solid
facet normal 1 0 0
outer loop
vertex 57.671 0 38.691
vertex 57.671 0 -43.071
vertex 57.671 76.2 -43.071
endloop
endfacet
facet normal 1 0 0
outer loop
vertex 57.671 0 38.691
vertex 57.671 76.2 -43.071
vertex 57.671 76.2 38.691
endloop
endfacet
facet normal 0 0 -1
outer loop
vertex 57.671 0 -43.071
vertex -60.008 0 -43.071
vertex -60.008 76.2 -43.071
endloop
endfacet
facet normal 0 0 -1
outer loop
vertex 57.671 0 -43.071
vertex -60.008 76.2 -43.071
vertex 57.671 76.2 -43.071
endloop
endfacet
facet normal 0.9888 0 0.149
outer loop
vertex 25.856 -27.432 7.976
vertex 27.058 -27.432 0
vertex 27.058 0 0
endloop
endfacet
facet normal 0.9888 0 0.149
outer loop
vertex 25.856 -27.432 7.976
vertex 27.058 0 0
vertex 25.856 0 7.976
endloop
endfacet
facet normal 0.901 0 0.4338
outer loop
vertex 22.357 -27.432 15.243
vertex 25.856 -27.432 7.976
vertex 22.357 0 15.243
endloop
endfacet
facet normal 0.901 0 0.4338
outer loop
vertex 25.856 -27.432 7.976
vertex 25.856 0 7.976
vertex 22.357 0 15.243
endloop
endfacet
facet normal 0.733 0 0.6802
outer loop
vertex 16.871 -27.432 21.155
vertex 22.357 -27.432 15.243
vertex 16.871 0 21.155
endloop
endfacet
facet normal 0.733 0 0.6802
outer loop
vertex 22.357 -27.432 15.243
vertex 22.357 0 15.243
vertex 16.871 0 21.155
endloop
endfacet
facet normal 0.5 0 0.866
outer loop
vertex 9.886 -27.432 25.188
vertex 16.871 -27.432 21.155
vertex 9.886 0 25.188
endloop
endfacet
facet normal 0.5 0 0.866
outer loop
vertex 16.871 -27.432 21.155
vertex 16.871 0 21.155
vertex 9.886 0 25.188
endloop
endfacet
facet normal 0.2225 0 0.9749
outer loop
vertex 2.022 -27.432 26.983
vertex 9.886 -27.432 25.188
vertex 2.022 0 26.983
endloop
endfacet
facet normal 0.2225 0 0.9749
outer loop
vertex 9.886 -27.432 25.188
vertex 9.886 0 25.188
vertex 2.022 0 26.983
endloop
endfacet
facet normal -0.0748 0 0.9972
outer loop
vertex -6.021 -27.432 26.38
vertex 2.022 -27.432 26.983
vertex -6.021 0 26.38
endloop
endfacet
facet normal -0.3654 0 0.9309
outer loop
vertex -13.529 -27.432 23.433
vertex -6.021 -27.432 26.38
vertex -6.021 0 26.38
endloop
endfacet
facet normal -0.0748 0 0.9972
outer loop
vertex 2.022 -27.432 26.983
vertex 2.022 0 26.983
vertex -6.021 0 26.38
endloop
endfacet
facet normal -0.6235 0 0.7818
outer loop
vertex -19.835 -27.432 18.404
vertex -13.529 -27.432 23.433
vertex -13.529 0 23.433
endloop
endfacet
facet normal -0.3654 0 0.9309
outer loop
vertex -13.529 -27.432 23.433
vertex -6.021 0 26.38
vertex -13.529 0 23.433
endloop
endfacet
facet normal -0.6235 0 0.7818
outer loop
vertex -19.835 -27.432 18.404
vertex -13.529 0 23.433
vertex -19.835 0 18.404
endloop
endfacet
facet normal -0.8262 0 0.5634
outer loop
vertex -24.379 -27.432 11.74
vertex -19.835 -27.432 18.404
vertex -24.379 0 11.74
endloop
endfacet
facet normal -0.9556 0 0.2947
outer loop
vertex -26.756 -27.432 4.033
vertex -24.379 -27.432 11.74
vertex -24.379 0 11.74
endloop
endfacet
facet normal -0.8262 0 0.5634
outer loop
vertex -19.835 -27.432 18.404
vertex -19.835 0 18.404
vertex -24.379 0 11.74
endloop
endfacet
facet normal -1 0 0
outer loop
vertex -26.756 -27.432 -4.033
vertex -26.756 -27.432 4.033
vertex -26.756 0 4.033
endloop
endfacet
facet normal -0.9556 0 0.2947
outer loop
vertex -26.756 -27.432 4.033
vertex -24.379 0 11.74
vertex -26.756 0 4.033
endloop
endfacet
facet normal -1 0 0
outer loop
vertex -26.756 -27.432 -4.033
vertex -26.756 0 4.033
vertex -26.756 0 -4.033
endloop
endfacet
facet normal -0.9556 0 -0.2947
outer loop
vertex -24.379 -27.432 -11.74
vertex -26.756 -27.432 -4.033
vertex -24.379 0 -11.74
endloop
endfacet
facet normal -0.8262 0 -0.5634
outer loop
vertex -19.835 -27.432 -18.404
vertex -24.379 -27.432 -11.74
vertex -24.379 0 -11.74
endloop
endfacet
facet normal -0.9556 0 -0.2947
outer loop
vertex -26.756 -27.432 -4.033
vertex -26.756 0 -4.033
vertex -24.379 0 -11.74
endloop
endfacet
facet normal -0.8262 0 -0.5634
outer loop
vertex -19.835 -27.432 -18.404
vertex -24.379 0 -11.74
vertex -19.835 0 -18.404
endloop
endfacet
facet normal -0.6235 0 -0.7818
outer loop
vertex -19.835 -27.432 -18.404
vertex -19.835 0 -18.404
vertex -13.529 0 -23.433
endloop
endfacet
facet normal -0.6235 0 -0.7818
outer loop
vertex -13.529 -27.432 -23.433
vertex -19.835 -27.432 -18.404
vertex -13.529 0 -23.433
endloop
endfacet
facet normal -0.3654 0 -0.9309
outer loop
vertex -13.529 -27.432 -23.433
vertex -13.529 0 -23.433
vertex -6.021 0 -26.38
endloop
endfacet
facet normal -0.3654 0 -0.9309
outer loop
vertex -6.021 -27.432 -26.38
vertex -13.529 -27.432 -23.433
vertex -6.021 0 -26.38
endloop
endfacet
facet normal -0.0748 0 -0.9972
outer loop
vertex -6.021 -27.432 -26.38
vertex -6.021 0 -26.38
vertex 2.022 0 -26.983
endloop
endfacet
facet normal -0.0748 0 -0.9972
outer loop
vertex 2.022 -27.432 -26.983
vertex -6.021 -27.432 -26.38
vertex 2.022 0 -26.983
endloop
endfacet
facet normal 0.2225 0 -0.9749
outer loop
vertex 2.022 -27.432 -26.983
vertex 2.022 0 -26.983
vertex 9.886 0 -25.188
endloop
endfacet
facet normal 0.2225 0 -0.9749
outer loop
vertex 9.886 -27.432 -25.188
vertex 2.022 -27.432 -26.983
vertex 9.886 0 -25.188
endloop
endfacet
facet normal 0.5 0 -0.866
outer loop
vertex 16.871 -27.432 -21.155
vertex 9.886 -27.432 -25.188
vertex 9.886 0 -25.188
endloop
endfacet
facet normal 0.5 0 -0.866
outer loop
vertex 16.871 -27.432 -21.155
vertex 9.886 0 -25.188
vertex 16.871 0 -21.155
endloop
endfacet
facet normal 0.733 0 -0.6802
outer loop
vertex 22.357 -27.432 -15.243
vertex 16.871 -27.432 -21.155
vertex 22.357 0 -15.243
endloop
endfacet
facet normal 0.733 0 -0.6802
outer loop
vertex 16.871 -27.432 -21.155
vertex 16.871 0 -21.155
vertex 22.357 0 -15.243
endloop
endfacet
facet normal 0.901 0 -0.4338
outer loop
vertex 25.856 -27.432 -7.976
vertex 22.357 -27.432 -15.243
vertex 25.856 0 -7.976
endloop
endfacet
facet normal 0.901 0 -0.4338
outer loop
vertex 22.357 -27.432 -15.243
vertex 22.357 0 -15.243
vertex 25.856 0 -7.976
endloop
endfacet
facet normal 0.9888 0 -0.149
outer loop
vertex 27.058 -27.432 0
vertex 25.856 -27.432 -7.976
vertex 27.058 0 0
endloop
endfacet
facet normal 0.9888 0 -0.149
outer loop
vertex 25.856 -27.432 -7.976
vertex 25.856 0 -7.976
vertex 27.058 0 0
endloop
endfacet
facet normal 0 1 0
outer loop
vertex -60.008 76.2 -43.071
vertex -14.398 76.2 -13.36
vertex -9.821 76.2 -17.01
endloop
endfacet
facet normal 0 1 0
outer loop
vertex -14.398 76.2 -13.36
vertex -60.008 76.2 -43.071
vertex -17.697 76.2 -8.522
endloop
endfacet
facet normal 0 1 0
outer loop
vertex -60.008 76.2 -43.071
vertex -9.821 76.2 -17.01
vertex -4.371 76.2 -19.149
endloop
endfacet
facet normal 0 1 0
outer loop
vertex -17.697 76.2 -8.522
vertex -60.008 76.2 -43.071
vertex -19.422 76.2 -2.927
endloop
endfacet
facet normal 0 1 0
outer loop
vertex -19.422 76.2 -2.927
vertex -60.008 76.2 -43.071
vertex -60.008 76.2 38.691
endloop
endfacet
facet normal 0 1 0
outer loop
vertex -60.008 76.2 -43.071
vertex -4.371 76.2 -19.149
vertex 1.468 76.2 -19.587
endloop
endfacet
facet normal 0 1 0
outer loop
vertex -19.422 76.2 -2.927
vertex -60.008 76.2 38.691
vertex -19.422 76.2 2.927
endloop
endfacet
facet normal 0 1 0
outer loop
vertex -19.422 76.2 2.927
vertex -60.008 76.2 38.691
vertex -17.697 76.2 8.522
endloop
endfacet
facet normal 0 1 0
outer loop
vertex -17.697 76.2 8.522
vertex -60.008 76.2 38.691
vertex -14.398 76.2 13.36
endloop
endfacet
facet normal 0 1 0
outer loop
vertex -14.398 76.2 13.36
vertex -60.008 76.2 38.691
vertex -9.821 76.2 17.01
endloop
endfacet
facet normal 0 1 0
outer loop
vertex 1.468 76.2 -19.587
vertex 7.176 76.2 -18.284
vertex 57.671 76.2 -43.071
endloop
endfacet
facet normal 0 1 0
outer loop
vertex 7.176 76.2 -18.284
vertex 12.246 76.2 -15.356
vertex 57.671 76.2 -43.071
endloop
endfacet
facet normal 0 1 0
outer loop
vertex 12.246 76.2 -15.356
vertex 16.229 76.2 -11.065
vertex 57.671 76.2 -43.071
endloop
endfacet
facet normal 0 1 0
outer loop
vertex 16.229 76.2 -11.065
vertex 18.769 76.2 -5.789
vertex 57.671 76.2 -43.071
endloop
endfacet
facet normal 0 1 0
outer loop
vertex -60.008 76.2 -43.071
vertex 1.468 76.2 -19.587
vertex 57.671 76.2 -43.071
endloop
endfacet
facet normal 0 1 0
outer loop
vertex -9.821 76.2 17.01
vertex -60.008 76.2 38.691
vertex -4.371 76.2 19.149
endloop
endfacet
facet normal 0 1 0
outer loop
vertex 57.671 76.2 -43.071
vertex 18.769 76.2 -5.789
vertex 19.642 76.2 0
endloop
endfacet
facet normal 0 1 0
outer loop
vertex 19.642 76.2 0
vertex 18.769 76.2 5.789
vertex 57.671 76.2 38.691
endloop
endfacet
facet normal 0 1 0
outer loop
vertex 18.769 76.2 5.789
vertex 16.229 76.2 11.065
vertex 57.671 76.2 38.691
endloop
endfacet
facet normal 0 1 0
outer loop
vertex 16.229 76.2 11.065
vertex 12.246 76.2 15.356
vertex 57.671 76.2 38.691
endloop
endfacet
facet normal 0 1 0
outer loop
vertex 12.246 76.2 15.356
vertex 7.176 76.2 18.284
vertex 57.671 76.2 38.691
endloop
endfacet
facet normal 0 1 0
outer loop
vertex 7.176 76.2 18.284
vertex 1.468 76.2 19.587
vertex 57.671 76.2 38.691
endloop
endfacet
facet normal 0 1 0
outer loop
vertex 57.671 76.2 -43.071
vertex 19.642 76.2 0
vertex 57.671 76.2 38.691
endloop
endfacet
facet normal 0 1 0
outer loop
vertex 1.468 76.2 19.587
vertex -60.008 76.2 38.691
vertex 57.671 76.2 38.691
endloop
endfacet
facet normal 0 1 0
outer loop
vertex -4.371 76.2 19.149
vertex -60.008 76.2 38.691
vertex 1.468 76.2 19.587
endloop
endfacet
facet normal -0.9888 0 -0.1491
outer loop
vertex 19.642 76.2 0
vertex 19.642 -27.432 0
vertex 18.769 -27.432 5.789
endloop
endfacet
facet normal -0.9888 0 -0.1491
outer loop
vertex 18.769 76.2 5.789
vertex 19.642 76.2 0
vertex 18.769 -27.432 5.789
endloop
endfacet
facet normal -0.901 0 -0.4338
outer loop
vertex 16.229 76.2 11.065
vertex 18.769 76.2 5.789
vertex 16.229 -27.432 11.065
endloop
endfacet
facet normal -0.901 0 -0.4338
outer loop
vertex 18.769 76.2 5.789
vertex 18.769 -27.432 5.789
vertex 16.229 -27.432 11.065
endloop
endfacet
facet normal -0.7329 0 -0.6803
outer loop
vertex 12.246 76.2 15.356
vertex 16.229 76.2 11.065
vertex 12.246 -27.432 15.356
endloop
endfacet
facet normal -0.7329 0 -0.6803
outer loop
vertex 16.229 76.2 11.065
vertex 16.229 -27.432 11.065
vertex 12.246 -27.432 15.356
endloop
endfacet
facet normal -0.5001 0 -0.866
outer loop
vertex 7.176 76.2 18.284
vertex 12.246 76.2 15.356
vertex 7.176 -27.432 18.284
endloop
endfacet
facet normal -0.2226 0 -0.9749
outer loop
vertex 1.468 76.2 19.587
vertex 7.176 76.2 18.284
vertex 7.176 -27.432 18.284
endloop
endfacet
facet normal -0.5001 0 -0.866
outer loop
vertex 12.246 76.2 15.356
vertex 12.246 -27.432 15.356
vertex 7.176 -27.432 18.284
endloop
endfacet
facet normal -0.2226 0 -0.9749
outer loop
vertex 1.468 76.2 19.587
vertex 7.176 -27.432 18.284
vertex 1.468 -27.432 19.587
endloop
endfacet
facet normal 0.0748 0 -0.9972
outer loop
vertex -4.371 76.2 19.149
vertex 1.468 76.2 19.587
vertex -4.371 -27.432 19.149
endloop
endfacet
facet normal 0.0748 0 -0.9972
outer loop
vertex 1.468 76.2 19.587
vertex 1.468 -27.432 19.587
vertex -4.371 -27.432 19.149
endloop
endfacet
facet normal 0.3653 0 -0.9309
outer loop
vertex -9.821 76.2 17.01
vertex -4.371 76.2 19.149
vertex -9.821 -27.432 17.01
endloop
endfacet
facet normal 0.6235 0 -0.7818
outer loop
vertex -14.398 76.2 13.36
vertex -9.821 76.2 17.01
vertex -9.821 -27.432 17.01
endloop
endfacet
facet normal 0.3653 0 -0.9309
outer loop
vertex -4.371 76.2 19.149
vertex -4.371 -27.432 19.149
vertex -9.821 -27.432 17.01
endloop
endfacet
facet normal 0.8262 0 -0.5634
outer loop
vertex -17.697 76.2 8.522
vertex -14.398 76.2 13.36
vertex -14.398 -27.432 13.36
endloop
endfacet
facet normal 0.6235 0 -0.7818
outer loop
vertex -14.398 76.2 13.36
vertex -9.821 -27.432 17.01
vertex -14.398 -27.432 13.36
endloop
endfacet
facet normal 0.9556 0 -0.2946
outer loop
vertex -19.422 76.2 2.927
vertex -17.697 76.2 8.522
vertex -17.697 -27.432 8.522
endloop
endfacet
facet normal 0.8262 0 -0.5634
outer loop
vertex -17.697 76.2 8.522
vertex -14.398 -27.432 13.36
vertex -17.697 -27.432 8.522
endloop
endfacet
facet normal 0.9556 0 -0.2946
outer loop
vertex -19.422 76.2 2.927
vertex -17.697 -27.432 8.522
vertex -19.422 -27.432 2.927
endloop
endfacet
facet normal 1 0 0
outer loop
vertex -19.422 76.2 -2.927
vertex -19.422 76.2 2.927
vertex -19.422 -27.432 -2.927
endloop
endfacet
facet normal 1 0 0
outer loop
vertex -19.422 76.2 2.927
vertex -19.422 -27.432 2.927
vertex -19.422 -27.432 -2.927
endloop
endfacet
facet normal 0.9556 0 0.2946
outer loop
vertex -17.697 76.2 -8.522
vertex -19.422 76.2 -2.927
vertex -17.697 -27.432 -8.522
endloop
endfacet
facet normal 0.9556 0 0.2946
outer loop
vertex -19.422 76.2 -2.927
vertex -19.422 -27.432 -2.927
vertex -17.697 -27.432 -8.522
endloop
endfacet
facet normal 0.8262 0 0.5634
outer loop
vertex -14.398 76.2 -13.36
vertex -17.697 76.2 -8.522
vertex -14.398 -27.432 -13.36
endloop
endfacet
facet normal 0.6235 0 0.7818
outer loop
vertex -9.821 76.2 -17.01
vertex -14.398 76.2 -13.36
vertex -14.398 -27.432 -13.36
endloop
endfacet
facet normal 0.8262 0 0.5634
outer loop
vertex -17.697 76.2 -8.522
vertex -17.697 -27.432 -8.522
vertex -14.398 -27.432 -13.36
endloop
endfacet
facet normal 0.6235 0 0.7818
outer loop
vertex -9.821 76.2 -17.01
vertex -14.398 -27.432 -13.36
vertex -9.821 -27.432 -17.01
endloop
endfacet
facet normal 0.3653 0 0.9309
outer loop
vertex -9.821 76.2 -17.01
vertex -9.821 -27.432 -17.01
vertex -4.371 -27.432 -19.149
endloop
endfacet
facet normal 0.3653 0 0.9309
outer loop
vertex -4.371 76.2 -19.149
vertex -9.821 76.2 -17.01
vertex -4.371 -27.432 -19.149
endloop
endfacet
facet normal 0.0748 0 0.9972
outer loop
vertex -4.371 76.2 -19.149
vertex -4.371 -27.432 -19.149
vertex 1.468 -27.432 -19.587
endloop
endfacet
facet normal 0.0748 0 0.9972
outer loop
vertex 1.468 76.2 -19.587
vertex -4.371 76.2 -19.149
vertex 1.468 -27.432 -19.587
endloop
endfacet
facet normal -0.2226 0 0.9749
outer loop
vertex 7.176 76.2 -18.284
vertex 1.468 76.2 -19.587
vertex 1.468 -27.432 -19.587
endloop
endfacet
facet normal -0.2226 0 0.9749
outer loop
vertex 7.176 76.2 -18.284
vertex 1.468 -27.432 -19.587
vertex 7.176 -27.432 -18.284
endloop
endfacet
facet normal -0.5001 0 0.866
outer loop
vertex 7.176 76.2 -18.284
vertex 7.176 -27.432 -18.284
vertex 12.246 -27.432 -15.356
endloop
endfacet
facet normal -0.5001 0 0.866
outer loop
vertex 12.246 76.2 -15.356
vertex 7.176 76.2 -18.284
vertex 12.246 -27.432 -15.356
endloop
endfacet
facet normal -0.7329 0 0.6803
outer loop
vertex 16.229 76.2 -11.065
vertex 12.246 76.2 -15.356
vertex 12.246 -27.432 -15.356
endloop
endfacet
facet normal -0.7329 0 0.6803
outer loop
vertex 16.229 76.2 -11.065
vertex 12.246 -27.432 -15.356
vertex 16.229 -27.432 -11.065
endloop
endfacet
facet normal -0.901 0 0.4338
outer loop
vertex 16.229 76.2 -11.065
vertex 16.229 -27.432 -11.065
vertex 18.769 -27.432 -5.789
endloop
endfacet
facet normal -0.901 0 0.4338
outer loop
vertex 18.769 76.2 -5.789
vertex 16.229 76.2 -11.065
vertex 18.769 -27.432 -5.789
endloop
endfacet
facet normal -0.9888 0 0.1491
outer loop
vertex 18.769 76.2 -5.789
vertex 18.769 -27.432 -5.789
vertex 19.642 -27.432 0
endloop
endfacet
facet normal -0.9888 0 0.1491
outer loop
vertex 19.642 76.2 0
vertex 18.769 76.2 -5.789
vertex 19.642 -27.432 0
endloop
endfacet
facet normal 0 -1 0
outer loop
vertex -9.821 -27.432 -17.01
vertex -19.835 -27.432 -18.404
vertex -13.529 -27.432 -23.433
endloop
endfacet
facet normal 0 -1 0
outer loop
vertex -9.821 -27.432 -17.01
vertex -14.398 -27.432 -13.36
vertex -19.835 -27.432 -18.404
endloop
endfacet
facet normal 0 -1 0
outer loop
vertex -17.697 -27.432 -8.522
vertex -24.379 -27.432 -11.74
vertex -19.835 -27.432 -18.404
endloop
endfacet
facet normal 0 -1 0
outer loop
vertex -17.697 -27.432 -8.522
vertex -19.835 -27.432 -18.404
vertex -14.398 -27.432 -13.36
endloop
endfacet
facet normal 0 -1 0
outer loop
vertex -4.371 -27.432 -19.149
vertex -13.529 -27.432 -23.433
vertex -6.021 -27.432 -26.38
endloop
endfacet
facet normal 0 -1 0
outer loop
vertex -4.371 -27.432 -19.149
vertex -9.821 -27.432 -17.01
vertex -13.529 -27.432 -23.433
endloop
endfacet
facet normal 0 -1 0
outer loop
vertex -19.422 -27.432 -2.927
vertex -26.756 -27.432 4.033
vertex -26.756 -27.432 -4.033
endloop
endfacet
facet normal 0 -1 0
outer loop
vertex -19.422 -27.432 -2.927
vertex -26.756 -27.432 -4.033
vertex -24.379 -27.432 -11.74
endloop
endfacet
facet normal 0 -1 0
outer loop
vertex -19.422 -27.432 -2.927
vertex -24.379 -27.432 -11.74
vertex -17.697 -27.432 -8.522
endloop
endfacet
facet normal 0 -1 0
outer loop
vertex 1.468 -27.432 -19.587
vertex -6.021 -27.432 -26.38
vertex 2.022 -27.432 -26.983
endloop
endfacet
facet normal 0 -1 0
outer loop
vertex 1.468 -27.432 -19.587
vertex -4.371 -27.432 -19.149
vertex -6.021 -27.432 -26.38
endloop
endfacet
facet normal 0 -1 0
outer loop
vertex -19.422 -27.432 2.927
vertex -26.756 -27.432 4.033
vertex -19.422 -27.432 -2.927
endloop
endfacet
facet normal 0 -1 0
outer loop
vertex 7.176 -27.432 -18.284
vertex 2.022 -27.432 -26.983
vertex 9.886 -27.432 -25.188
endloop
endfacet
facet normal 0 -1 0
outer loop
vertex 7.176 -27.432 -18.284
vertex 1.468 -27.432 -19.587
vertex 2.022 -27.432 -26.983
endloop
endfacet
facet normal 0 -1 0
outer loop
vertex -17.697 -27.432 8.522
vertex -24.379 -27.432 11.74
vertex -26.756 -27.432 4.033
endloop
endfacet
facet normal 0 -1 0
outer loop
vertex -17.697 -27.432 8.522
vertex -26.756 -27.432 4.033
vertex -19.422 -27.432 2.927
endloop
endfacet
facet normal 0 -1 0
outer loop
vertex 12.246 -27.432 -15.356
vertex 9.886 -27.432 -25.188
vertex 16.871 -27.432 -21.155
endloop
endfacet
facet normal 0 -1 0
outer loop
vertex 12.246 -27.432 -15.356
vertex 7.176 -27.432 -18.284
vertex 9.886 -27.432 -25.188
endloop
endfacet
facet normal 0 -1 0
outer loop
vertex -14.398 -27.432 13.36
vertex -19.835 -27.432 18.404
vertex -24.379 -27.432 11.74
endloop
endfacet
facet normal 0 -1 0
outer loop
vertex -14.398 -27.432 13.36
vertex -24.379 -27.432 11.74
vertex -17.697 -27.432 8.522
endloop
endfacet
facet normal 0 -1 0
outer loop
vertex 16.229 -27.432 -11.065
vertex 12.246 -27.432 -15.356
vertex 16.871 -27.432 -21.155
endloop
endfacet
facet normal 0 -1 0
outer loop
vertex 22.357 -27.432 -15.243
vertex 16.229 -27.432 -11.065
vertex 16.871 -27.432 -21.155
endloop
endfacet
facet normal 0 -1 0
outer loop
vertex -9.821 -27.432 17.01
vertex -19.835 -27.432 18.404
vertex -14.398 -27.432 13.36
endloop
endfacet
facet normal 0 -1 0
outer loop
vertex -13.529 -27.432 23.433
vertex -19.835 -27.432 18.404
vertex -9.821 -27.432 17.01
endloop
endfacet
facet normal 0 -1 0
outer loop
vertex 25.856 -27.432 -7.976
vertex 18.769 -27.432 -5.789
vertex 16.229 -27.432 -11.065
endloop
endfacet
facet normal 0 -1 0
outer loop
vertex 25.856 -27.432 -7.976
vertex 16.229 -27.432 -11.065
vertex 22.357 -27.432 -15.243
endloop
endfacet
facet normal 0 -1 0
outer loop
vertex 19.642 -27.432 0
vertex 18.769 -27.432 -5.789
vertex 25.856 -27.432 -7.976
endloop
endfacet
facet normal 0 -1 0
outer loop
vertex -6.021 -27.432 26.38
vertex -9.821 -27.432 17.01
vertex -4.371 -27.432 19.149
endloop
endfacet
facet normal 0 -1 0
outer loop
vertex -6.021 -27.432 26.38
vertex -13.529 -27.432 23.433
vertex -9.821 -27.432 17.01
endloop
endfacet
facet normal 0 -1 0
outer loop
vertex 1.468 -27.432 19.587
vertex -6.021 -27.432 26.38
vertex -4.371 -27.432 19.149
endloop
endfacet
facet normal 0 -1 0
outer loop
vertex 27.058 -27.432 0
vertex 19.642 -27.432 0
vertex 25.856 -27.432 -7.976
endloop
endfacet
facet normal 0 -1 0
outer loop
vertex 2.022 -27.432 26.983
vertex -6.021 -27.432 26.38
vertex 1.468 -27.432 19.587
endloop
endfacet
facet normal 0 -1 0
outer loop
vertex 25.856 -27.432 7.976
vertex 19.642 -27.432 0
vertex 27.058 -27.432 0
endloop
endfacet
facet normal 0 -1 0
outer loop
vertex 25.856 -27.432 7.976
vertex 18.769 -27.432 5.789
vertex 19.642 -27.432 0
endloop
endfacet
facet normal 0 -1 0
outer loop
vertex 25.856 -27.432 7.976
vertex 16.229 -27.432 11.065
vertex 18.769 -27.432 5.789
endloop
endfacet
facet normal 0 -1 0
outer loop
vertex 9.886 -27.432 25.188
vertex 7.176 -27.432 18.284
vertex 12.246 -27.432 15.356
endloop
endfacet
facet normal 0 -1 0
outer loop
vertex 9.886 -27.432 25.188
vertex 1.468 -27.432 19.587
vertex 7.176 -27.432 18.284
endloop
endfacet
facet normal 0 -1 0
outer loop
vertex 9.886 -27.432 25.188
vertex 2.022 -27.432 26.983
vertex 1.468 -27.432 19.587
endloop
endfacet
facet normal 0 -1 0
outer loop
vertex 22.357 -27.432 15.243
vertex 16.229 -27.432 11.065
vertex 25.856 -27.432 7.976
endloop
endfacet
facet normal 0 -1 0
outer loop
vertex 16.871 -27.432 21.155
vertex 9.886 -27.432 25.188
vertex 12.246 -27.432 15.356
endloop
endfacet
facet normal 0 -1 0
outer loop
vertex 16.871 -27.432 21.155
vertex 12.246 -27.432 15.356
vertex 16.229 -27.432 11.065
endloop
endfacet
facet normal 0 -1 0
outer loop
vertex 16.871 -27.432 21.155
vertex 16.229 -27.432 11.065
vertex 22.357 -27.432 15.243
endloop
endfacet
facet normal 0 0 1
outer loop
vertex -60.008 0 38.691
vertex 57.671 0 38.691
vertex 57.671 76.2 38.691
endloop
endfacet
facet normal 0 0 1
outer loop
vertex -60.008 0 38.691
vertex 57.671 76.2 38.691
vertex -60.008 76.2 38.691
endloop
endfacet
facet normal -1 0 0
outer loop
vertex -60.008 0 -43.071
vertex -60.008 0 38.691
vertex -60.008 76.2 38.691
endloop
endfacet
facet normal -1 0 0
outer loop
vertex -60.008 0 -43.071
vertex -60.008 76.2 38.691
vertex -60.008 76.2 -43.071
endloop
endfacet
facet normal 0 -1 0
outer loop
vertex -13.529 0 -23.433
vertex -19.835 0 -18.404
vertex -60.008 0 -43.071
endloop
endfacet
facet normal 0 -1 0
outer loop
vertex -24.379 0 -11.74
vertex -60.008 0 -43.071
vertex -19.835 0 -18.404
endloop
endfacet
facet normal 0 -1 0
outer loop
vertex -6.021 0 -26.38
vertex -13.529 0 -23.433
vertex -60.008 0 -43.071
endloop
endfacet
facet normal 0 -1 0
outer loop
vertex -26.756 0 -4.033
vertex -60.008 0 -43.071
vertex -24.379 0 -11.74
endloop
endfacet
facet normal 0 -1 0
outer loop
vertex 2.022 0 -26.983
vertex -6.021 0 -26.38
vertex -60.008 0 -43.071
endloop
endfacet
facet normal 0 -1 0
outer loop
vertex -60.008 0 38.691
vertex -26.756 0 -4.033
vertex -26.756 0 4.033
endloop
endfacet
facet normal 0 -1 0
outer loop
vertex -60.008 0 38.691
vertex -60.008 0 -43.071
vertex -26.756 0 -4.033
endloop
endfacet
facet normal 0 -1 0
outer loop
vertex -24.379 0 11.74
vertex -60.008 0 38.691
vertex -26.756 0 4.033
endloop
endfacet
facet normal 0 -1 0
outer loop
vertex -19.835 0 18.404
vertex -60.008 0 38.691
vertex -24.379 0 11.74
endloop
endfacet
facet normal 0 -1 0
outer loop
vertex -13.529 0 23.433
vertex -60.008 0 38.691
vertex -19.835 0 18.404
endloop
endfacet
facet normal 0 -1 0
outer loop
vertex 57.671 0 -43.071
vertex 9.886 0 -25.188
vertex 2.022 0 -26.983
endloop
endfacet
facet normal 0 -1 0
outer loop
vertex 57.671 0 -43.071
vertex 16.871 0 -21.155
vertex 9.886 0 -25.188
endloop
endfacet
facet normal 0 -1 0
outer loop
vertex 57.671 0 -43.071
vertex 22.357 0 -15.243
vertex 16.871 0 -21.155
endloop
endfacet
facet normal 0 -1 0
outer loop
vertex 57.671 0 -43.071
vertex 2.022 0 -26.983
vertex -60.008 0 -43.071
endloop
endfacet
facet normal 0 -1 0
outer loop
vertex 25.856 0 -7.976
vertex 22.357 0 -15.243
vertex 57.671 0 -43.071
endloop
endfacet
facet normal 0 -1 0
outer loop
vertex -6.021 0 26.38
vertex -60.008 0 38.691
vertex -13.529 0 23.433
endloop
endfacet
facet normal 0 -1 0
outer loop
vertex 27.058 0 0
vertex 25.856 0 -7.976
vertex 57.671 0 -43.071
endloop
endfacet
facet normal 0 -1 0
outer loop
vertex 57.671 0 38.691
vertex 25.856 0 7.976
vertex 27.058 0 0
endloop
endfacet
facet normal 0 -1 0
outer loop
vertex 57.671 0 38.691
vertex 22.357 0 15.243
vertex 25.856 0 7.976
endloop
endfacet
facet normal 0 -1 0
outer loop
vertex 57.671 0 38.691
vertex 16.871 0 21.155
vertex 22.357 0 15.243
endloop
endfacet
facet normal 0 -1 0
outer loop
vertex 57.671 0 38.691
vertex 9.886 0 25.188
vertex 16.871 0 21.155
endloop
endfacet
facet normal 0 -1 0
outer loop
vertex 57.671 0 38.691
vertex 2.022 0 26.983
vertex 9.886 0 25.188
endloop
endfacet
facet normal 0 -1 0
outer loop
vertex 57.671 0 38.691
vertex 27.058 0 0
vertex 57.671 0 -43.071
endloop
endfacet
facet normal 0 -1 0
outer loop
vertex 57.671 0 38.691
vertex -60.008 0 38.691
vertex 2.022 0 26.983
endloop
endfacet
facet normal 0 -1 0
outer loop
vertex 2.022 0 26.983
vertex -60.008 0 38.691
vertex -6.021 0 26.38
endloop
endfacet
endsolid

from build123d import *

# Parameters (mm, degrees)
F1_DEPTH = 76.2
F2_R     = 27.058381
F3_DEPTH = 27.432
F4_R     = 19.641698
F5_DEPTH = 197.104


with BuildPart() as f1:
    # F0 (on Front) → F1 (new body)
    with BuildSketch(Plane.XZ):
        Polygon((57.671439, 38.690969), (-60.007501, 38.690969), (-60.007501, -43.07108), (57.671439, -43.07108), (57.671439, 35.186879), align=None)
    extrude(amount=-F1_DEPTH)

    # F2 (on Front) → F3 (join)
    with BuildSketch(Plane.XZ):
        Circle(F2_R)
    extrude(amount=F3_DEPTH)

    # F4 (on face) → F5 (cut)
    with BuildSketch(Plane.XZ.offset(27.432)):
        Circle(F4_R)
    extrude(amount=-F5_DEPTH, mode=Mode.SUBTRACT)


solid = f1.part
